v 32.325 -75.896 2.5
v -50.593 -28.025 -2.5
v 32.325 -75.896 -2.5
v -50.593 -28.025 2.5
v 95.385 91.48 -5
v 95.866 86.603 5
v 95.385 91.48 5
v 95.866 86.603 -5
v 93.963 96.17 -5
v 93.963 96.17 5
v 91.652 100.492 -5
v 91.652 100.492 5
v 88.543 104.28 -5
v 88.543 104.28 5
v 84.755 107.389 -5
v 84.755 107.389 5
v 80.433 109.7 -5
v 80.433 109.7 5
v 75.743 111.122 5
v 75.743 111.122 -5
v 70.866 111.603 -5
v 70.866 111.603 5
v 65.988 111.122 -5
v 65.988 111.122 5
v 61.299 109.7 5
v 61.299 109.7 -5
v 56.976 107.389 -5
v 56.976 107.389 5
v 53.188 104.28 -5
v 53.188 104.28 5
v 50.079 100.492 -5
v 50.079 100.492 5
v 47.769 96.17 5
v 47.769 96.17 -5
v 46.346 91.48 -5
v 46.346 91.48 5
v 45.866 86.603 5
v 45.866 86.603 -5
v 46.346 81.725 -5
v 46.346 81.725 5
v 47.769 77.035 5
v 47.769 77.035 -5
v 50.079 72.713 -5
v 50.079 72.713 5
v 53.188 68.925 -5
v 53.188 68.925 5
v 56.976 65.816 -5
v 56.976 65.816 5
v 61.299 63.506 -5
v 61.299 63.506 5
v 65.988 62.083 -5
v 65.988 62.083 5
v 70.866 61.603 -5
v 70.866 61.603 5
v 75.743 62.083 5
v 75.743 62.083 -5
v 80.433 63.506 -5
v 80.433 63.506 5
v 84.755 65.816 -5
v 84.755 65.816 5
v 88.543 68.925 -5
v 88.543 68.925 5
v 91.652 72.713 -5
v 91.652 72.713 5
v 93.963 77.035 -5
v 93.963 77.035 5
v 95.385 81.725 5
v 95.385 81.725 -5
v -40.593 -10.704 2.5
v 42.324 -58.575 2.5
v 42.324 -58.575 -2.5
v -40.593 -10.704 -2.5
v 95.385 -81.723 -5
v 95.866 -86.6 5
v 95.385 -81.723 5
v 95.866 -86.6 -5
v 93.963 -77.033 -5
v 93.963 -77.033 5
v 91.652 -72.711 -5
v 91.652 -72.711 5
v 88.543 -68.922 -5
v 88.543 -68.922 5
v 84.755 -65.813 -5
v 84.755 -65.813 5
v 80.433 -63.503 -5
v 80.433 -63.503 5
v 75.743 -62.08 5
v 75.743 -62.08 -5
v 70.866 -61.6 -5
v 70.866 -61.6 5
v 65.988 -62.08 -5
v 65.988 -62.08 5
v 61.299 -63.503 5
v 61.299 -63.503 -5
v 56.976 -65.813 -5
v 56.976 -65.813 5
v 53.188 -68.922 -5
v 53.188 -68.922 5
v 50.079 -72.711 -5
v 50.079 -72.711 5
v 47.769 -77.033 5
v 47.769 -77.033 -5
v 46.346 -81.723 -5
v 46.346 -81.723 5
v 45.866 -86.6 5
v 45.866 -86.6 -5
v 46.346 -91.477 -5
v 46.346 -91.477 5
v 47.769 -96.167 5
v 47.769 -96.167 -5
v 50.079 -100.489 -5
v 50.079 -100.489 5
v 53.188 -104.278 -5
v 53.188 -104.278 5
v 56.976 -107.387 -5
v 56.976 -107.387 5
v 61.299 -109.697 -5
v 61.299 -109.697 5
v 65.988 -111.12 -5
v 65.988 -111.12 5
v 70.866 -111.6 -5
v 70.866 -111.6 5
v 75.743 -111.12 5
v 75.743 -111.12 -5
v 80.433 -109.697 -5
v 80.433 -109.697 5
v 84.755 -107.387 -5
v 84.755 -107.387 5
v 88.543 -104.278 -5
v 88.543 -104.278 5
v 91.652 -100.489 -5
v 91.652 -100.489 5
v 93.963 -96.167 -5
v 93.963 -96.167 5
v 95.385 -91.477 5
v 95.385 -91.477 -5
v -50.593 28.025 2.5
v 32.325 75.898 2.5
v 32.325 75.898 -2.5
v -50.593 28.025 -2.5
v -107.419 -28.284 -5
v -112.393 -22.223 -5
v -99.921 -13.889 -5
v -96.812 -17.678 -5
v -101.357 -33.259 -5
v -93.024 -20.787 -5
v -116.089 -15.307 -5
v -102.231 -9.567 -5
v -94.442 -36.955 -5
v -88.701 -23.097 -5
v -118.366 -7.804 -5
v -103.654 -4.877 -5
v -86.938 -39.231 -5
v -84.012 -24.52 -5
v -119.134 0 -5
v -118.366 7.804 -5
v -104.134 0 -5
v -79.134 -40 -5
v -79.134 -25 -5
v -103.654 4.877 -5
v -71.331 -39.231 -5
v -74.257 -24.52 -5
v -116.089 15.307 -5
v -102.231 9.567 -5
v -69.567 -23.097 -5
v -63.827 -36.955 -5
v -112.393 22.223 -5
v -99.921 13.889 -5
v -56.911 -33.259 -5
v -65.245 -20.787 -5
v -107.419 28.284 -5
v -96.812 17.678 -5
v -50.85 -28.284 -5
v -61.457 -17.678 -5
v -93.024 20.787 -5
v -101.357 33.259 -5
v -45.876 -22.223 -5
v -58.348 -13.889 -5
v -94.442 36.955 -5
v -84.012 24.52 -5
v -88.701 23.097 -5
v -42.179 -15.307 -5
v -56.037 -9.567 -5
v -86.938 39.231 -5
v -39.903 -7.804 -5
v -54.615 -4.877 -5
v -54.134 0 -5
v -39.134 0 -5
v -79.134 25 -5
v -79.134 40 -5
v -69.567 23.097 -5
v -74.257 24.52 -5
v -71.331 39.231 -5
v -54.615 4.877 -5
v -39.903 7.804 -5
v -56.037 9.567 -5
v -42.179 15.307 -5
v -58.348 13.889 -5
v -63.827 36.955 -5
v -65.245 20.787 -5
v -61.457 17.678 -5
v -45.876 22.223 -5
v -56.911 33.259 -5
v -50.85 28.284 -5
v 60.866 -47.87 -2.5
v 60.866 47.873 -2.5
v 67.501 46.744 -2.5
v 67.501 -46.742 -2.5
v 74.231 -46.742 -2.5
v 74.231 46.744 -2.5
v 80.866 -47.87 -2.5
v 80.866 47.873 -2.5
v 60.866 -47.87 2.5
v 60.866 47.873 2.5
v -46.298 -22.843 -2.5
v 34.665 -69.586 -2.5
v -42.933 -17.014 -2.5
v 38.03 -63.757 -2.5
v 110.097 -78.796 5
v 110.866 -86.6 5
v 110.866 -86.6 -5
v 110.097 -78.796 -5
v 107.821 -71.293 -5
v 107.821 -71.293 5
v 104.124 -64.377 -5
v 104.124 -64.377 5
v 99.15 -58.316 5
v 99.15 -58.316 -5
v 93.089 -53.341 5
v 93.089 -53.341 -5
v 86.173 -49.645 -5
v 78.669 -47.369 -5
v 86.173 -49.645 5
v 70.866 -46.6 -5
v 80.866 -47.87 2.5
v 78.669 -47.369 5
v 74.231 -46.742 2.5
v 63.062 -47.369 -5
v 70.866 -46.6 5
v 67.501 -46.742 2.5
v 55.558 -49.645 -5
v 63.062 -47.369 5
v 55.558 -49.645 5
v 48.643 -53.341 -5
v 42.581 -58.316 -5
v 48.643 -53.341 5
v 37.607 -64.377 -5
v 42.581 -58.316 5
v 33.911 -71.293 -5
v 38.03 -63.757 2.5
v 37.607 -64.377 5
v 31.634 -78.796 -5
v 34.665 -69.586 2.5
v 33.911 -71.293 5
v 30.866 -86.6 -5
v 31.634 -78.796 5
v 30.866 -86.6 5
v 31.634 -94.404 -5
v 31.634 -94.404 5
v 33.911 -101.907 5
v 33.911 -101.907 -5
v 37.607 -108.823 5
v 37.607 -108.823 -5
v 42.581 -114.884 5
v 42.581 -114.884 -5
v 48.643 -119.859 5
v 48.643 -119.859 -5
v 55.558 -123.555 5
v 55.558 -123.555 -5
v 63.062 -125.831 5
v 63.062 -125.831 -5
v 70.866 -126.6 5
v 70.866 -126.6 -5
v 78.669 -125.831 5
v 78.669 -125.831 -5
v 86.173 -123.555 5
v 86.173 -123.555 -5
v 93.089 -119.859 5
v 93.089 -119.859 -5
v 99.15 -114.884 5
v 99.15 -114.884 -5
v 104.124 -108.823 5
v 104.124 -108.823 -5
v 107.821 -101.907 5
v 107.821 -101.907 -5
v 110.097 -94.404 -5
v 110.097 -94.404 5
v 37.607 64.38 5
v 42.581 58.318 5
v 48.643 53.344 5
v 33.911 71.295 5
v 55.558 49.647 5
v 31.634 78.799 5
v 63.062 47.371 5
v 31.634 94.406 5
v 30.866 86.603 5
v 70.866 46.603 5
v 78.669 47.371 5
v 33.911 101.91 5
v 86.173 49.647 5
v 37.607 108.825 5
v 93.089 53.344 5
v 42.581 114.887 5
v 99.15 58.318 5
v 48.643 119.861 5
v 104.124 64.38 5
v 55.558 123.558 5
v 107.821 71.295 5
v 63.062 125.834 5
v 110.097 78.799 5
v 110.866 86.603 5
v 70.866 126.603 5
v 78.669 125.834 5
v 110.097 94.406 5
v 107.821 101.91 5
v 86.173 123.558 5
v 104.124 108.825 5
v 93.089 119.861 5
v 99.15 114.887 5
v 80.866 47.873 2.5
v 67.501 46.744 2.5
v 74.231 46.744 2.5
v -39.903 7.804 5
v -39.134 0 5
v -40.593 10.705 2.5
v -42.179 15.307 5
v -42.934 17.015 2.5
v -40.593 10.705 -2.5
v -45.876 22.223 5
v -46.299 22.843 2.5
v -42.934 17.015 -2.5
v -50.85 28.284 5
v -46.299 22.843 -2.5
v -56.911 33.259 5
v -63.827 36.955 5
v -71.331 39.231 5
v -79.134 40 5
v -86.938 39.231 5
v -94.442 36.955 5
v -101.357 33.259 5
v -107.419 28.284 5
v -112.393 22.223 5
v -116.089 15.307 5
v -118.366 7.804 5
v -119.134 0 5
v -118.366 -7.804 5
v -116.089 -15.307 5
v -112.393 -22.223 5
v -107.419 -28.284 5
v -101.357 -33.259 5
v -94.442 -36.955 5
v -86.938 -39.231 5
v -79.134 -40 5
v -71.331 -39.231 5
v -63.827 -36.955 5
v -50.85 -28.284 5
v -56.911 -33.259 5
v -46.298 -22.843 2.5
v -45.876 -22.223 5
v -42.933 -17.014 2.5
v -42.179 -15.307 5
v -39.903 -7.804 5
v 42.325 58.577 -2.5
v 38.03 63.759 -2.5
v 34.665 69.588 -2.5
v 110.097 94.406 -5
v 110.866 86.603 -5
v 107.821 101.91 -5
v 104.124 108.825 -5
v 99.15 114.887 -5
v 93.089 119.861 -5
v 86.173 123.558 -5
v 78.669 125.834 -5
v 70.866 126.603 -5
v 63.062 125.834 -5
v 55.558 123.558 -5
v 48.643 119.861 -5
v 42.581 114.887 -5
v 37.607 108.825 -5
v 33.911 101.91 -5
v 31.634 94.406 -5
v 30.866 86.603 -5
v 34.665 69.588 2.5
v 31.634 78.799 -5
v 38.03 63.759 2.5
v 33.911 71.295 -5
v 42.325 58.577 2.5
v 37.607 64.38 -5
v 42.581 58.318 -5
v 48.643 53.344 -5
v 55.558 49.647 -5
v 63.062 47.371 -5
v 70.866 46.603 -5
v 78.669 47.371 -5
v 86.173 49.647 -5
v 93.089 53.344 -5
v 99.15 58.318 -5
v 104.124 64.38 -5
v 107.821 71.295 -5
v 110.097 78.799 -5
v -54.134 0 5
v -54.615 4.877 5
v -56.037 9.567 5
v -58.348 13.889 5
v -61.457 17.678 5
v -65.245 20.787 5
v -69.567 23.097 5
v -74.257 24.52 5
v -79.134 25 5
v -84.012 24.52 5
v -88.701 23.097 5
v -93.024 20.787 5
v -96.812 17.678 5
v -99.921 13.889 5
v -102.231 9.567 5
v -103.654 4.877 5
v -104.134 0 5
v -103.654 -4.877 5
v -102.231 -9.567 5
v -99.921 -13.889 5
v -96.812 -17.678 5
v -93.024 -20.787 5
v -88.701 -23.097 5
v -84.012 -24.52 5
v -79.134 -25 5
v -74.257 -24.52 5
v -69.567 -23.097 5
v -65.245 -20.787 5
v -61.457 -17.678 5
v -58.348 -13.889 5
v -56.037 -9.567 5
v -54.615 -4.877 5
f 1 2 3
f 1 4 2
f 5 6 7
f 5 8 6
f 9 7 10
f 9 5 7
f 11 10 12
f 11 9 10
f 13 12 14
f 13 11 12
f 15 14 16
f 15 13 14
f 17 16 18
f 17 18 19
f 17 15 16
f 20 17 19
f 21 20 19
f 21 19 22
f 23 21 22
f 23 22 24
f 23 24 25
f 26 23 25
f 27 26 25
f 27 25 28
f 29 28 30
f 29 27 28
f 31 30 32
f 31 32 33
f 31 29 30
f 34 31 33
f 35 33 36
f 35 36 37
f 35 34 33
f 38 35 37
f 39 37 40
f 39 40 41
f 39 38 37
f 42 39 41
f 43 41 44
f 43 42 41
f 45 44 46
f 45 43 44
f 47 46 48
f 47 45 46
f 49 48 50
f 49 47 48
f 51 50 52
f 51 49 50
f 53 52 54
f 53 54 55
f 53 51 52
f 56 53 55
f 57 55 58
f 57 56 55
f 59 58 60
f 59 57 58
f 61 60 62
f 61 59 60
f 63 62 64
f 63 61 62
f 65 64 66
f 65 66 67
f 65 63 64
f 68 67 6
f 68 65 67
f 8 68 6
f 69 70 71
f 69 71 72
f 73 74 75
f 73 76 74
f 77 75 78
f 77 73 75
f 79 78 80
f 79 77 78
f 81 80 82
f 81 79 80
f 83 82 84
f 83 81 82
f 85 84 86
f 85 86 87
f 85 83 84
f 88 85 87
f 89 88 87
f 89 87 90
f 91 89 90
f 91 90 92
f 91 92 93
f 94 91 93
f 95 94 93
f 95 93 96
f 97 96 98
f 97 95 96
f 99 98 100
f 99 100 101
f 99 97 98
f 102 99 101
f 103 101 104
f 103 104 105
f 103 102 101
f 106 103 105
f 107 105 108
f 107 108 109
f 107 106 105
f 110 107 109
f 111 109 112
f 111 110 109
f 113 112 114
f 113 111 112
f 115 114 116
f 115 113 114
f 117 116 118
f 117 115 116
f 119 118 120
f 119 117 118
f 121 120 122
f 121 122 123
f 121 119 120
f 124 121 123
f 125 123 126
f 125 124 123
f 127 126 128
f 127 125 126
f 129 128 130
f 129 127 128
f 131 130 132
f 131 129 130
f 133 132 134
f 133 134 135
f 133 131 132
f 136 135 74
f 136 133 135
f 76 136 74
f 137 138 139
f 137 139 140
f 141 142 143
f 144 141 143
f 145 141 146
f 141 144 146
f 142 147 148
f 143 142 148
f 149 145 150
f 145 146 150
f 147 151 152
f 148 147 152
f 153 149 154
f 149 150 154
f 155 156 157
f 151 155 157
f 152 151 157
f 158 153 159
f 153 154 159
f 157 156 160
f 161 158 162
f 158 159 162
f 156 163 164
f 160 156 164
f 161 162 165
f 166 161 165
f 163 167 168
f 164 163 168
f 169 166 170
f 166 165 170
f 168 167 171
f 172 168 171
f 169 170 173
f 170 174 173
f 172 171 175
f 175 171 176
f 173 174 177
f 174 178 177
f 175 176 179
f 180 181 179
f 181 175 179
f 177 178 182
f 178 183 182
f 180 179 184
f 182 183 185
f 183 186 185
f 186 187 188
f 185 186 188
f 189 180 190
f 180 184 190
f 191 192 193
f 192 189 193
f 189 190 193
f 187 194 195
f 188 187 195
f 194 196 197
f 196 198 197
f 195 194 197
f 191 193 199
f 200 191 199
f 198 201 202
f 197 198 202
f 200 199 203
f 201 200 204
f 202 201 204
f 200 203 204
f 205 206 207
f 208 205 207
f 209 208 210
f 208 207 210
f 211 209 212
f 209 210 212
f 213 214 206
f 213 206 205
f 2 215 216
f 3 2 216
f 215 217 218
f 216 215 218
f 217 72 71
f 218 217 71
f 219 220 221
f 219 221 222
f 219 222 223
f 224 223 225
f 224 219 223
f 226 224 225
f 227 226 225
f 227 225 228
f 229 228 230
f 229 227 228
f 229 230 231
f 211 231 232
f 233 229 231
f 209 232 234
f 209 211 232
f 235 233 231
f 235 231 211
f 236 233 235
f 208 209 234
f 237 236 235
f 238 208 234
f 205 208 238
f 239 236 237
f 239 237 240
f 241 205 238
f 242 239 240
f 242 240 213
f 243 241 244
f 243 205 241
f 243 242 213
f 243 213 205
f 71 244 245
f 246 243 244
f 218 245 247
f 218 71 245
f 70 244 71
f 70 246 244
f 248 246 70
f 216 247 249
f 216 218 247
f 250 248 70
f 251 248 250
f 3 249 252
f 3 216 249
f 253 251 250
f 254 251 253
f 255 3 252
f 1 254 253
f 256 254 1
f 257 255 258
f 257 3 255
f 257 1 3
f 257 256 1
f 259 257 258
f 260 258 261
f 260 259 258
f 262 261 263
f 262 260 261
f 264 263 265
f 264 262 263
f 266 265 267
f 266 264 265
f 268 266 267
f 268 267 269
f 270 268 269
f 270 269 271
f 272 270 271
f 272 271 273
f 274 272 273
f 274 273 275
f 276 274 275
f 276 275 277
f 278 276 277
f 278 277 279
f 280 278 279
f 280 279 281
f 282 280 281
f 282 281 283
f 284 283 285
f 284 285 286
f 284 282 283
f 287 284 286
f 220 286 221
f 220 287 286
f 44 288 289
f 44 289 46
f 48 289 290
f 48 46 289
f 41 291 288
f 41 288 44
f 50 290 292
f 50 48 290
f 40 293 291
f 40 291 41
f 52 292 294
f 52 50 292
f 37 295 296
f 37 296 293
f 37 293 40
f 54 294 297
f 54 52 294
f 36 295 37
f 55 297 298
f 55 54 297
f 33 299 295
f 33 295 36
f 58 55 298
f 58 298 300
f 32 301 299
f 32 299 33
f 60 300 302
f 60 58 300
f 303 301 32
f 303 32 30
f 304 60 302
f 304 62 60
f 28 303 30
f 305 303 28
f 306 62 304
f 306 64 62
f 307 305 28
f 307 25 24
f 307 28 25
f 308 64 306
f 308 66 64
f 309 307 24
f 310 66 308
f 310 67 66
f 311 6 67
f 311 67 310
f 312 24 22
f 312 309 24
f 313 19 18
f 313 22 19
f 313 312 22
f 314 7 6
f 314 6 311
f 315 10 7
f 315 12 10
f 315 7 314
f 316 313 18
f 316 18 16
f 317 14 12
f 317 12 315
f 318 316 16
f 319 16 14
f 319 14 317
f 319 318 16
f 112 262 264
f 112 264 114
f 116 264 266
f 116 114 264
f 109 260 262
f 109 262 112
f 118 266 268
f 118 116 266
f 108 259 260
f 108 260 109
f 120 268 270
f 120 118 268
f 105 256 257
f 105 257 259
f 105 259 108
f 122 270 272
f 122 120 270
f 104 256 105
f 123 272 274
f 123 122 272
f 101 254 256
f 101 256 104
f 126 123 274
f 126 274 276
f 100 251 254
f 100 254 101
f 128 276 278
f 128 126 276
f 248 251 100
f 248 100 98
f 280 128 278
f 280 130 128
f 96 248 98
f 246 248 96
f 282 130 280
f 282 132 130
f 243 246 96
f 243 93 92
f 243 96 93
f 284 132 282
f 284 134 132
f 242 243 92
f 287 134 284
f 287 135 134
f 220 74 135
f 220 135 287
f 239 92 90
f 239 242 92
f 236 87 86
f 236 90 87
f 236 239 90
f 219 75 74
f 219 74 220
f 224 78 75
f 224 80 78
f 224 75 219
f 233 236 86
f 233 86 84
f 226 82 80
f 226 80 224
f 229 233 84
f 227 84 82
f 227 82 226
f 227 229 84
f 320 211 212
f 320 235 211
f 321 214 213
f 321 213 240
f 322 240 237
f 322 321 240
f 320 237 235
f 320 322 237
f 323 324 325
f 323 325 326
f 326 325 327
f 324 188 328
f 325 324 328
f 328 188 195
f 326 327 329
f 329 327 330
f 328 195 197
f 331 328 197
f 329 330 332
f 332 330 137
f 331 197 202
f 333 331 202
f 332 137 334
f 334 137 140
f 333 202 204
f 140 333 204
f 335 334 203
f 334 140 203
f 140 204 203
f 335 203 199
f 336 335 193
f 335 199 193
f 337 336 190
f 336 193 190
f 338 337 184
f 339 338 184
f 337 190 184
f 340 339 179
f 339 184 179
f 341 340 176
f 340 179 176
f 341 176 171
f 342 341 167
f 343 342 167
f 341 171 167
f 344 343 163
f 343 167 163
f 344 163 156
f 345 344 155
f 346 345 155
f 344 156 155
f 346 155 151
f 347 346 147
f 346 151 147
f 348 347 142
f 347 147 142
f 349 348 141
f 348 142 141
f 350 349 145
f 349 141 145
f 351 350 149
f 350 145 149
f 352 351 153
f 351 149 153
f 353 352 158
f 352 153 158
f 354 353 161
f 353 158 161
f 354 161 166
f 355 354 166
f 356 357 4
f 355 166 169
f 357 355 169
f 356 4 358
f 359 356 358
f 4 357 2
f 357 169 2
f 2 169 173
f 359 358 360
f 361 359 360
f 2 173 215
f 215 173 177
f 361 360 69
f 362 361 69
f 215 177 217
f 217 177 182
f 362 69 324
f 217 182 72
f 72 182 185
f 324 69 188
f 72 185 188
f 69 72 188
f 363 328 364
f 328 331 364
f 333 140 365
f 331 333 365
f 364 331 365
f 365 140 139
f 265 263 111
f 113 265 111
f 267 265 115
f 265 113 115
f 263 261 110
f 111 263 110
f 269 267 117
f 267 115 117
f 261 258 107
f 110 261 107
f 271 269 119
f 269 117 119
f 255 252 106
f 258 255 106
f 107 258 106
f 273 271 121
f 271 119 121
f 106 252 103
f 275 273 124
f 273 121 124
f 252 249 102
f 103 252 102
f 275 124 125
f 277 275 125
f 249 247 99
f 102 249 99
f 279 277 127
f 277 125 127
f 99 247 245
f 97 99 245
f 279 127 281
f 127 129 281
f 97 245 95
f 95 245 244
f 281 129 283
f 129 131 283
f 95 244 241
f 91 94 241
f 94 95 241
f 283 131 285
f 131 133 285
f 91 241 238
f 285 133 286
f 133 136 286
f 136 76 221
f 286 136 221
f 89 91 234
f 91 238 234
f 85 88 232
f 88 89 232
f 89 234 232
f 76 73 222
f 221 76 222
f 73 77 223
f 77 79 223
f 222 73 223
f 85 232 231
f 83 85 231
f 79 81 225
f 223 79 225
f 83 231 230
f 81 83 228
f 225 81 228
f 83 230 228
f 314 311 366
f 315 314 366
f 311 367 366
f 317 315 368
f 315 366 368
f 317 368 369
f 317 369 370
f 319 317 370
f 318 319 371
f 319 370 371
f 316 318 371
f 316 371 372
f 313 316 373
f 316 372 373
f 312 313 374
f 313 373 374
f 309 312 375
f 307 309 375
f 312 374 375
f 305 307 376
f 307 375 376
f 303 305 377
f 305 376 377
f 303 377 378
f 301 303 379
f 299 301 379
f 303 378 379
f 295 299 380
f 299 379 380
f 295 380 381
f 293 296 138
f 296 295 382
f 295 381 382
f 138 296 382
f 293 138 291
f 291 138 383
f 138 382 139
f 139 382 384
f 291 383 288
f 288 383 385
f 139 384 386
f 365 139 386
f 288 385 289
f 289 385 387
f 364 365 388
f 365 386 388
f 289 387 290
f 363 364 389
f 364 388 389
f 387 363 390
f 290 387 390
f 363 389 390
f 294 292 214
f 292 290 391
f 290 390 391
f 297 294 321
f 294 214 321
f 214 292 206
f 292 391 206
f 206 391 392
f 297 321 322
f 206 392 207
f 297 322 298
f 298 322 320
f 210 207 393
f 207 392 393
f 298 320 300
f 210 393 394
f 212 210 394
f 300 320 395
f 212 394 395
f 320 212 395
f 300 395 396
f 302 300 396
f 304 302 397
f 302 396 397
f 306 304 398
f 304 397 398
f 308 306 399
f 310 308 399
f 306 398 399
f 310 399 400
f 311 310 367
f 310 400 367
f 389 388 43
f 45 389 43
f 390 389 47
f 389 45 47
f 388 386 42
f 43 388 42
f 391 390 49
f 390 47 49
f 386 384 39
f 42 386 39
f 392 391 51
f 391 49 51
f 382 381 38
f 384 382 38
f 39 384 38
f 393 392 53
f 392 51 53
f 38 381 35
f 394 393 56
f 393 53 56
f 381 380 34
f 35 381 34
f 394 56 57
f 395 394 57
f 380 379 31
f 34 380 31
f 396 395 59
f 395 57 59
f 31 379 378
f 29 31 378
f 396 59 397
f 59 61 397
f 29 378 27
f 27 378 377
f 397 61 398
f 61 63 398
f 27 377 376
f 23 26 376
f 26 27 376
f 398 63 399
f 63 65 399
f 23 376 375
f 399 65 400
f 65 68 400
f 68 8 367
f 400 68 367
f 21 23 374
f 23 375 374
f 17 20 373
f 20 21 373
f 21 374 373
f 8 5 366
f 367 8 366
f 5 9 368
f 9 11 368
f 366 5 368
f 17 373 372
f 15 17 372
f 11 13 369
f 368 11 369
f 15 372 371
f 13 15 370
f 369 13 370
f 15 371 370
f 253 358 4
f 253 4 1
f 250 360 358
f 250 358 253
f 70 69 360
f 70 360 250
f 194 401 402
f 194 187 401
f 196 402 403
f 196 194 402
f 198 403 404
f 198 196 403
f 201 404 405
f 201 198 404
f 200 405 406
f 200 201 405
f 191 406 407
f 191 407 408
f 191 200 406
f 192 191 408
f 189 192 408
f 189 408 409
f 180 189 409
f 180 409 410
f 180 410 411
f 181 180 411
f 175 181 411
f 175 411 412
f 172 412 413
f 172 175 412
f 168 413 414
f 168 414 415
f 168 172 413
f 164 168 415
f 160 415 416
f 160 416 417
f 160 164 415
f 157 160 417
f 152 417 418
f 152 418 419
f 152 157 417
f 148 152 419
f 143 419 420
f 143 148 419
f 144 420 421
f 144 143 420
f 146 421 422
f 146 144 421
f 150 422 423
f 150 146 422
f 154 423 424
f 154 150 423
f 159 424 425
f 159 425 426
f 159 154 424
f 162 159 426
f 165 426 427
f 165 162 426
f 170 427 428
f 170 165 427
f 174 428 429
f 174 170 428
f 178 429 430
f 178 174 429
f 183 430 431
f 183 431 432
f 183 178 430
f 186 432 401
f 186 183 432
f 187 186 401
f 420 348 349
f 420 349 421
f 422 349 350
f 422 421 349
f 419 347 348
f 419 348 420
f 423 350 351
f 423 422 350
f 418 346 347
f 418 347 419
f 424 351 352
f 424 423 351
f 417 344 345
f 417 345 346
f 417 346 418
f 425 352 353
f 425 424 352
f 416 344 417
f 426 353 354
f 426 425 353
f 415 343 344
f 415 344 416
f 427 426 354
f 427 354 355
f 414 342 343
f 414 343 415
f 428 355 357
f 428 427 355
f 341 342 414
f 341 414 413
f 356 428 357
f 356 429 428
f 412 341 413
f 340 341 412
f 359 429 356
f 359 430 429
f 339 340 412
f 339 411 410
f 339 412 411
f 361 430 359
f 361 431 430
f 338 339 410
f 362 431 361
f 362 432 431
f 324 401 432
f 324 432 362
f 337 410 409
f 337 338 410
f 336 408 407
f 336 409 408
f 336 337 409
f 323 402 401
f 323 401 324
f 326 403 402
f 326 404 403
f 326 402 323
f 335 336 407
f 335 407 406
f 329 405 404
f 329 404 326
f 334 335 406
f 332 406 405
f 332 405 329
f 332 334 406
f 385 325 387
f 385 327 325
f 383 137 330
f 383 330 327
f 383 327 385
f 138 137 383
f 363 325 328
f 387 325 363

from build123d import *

# Parameters (mm, degrees)
BOSS_EXTRUDE1_DEPTH   = 2.5
BOSS_EXTRUDE1_2_DEPTH = 2.5
BOSS_EXTRUDE1_3_DEPTH = 2.5
SKETCH1_3_R           = 40
SKETCH1_3_R_2         = 25
BOSS_EXTRUDE2_DEPTH   = 5


with BuildPart() as part:
    # Sketch1 → Boss-Extrude1 (new, symmetric)
    with BuildSketch(Plane.XY):
        with BuildLine():
            Line((-40.593283957, 10.704662693), (42.324676718, 58.57736961))
            ThreePointArc((42.324676718, 58.57736961), (36.224680229, 66.602540378), (32.324676718, 75.897877685))
            Line((32.324676718, 75.897877685), (-50.593283957, 28.025170769))
            ThreePointArc((-50.593283957, 28.025170769), (-44.493287469, 20), (-40.593283957, 10.704662693))
        make_face()
    extrude(amount=BOSS_EXTRUDE1_DEPTH, both=True)



with BuildPart() as body_2:
    # Sketch1 → Boss-Extrude1 2 (new, symmetric)
    with BuildSketch(Plane.XY):
        with BuildLine():
            ThreePointArc((32.324540751, -75.895826853), (36.224426192, -66.600440011), (42.324320743, -58.575191763))
            Line((42.324320743, -58.575191763), (-40.593147991, -10.704173147))
            ThreePointArc((-40.593147991, -10.704173147), (-44.493033432, -19.999559989), (-50.592927983, -28.024808237))
            Line((-50.592927983, -28.024808237), (32.324540751, -75.895826853))
        make_face()
    extrude(amount=BOSS_EXTRUDE1_2_DEPTH, both=True)


with BuildPart() as body_3:
    # Sketch1 → Boss-Extrude1 3 (new, symmetric)
    with BuildSketch(Plane.XY):
        with BuildLine():
            ThreePointArc((80.86569638, 47.872706916), (70.86569638, 46.602540378), (60.86569638, 47.872706916))
            Line((60.86569638, 47.872706916), (60.86569638, -47.870166538))
            ThreePointArc((60.86569638, -47.870166538), (70.86569638, -46.6), (80.86569638, -47.870166538))
            Line((80.86569638, -47.870166538), (80.86569638, 47.872706916))
        make_face()
    extrude(amount=BOSS_EXTRUDE1_3_DEPTH, both=True)


with BuildPart() as part_1:
    add(part.part)

    add(body_2.part)  # Boss-Extrude2 merges body 2

    add(body_3.part)  # Boss-Extrude2 merges body 3
    # Sketch1<3> → Boss-Extrude2 (add, symmetric)
    # profile 1 of 3: a face of its own
    with BuildSketch(Plane.XY):
        with Locations((-79.13430362, 0)):
            Circle(SKETCH1_3_R)
        with Locations((-79.13430362, 0)):
            Circle(SKETCH1_3_R_2, mode=Mode.SUBTRACT)
    # profile 2 of 3: a face of its own
    with BuildSketch(Plane.XY):
        with Locations((70.86569638, 86.602540378)):
            Circle(SKETCH1_3_R)
        with Locations((70.86569638, 86.602540378)):
            Circle(SKETCH1_3_R_2, mode=Mode.SUBTRACT)
    # profile 3 of 3: a face of its own
    with BuildSketch(Plane.XY):
        with Locations((70.86569638, -86.6)):
            Circle(SKETCH1_3_R)
        with Locations((70.86569638, -86.6)):
            Circle(SKETCH1_3_R_2, mode=Mode.SUBTRACT)
    extrude(amount=BOSS_EXTRUDE2_DEPTH, both=True)


solid = part_1.part
